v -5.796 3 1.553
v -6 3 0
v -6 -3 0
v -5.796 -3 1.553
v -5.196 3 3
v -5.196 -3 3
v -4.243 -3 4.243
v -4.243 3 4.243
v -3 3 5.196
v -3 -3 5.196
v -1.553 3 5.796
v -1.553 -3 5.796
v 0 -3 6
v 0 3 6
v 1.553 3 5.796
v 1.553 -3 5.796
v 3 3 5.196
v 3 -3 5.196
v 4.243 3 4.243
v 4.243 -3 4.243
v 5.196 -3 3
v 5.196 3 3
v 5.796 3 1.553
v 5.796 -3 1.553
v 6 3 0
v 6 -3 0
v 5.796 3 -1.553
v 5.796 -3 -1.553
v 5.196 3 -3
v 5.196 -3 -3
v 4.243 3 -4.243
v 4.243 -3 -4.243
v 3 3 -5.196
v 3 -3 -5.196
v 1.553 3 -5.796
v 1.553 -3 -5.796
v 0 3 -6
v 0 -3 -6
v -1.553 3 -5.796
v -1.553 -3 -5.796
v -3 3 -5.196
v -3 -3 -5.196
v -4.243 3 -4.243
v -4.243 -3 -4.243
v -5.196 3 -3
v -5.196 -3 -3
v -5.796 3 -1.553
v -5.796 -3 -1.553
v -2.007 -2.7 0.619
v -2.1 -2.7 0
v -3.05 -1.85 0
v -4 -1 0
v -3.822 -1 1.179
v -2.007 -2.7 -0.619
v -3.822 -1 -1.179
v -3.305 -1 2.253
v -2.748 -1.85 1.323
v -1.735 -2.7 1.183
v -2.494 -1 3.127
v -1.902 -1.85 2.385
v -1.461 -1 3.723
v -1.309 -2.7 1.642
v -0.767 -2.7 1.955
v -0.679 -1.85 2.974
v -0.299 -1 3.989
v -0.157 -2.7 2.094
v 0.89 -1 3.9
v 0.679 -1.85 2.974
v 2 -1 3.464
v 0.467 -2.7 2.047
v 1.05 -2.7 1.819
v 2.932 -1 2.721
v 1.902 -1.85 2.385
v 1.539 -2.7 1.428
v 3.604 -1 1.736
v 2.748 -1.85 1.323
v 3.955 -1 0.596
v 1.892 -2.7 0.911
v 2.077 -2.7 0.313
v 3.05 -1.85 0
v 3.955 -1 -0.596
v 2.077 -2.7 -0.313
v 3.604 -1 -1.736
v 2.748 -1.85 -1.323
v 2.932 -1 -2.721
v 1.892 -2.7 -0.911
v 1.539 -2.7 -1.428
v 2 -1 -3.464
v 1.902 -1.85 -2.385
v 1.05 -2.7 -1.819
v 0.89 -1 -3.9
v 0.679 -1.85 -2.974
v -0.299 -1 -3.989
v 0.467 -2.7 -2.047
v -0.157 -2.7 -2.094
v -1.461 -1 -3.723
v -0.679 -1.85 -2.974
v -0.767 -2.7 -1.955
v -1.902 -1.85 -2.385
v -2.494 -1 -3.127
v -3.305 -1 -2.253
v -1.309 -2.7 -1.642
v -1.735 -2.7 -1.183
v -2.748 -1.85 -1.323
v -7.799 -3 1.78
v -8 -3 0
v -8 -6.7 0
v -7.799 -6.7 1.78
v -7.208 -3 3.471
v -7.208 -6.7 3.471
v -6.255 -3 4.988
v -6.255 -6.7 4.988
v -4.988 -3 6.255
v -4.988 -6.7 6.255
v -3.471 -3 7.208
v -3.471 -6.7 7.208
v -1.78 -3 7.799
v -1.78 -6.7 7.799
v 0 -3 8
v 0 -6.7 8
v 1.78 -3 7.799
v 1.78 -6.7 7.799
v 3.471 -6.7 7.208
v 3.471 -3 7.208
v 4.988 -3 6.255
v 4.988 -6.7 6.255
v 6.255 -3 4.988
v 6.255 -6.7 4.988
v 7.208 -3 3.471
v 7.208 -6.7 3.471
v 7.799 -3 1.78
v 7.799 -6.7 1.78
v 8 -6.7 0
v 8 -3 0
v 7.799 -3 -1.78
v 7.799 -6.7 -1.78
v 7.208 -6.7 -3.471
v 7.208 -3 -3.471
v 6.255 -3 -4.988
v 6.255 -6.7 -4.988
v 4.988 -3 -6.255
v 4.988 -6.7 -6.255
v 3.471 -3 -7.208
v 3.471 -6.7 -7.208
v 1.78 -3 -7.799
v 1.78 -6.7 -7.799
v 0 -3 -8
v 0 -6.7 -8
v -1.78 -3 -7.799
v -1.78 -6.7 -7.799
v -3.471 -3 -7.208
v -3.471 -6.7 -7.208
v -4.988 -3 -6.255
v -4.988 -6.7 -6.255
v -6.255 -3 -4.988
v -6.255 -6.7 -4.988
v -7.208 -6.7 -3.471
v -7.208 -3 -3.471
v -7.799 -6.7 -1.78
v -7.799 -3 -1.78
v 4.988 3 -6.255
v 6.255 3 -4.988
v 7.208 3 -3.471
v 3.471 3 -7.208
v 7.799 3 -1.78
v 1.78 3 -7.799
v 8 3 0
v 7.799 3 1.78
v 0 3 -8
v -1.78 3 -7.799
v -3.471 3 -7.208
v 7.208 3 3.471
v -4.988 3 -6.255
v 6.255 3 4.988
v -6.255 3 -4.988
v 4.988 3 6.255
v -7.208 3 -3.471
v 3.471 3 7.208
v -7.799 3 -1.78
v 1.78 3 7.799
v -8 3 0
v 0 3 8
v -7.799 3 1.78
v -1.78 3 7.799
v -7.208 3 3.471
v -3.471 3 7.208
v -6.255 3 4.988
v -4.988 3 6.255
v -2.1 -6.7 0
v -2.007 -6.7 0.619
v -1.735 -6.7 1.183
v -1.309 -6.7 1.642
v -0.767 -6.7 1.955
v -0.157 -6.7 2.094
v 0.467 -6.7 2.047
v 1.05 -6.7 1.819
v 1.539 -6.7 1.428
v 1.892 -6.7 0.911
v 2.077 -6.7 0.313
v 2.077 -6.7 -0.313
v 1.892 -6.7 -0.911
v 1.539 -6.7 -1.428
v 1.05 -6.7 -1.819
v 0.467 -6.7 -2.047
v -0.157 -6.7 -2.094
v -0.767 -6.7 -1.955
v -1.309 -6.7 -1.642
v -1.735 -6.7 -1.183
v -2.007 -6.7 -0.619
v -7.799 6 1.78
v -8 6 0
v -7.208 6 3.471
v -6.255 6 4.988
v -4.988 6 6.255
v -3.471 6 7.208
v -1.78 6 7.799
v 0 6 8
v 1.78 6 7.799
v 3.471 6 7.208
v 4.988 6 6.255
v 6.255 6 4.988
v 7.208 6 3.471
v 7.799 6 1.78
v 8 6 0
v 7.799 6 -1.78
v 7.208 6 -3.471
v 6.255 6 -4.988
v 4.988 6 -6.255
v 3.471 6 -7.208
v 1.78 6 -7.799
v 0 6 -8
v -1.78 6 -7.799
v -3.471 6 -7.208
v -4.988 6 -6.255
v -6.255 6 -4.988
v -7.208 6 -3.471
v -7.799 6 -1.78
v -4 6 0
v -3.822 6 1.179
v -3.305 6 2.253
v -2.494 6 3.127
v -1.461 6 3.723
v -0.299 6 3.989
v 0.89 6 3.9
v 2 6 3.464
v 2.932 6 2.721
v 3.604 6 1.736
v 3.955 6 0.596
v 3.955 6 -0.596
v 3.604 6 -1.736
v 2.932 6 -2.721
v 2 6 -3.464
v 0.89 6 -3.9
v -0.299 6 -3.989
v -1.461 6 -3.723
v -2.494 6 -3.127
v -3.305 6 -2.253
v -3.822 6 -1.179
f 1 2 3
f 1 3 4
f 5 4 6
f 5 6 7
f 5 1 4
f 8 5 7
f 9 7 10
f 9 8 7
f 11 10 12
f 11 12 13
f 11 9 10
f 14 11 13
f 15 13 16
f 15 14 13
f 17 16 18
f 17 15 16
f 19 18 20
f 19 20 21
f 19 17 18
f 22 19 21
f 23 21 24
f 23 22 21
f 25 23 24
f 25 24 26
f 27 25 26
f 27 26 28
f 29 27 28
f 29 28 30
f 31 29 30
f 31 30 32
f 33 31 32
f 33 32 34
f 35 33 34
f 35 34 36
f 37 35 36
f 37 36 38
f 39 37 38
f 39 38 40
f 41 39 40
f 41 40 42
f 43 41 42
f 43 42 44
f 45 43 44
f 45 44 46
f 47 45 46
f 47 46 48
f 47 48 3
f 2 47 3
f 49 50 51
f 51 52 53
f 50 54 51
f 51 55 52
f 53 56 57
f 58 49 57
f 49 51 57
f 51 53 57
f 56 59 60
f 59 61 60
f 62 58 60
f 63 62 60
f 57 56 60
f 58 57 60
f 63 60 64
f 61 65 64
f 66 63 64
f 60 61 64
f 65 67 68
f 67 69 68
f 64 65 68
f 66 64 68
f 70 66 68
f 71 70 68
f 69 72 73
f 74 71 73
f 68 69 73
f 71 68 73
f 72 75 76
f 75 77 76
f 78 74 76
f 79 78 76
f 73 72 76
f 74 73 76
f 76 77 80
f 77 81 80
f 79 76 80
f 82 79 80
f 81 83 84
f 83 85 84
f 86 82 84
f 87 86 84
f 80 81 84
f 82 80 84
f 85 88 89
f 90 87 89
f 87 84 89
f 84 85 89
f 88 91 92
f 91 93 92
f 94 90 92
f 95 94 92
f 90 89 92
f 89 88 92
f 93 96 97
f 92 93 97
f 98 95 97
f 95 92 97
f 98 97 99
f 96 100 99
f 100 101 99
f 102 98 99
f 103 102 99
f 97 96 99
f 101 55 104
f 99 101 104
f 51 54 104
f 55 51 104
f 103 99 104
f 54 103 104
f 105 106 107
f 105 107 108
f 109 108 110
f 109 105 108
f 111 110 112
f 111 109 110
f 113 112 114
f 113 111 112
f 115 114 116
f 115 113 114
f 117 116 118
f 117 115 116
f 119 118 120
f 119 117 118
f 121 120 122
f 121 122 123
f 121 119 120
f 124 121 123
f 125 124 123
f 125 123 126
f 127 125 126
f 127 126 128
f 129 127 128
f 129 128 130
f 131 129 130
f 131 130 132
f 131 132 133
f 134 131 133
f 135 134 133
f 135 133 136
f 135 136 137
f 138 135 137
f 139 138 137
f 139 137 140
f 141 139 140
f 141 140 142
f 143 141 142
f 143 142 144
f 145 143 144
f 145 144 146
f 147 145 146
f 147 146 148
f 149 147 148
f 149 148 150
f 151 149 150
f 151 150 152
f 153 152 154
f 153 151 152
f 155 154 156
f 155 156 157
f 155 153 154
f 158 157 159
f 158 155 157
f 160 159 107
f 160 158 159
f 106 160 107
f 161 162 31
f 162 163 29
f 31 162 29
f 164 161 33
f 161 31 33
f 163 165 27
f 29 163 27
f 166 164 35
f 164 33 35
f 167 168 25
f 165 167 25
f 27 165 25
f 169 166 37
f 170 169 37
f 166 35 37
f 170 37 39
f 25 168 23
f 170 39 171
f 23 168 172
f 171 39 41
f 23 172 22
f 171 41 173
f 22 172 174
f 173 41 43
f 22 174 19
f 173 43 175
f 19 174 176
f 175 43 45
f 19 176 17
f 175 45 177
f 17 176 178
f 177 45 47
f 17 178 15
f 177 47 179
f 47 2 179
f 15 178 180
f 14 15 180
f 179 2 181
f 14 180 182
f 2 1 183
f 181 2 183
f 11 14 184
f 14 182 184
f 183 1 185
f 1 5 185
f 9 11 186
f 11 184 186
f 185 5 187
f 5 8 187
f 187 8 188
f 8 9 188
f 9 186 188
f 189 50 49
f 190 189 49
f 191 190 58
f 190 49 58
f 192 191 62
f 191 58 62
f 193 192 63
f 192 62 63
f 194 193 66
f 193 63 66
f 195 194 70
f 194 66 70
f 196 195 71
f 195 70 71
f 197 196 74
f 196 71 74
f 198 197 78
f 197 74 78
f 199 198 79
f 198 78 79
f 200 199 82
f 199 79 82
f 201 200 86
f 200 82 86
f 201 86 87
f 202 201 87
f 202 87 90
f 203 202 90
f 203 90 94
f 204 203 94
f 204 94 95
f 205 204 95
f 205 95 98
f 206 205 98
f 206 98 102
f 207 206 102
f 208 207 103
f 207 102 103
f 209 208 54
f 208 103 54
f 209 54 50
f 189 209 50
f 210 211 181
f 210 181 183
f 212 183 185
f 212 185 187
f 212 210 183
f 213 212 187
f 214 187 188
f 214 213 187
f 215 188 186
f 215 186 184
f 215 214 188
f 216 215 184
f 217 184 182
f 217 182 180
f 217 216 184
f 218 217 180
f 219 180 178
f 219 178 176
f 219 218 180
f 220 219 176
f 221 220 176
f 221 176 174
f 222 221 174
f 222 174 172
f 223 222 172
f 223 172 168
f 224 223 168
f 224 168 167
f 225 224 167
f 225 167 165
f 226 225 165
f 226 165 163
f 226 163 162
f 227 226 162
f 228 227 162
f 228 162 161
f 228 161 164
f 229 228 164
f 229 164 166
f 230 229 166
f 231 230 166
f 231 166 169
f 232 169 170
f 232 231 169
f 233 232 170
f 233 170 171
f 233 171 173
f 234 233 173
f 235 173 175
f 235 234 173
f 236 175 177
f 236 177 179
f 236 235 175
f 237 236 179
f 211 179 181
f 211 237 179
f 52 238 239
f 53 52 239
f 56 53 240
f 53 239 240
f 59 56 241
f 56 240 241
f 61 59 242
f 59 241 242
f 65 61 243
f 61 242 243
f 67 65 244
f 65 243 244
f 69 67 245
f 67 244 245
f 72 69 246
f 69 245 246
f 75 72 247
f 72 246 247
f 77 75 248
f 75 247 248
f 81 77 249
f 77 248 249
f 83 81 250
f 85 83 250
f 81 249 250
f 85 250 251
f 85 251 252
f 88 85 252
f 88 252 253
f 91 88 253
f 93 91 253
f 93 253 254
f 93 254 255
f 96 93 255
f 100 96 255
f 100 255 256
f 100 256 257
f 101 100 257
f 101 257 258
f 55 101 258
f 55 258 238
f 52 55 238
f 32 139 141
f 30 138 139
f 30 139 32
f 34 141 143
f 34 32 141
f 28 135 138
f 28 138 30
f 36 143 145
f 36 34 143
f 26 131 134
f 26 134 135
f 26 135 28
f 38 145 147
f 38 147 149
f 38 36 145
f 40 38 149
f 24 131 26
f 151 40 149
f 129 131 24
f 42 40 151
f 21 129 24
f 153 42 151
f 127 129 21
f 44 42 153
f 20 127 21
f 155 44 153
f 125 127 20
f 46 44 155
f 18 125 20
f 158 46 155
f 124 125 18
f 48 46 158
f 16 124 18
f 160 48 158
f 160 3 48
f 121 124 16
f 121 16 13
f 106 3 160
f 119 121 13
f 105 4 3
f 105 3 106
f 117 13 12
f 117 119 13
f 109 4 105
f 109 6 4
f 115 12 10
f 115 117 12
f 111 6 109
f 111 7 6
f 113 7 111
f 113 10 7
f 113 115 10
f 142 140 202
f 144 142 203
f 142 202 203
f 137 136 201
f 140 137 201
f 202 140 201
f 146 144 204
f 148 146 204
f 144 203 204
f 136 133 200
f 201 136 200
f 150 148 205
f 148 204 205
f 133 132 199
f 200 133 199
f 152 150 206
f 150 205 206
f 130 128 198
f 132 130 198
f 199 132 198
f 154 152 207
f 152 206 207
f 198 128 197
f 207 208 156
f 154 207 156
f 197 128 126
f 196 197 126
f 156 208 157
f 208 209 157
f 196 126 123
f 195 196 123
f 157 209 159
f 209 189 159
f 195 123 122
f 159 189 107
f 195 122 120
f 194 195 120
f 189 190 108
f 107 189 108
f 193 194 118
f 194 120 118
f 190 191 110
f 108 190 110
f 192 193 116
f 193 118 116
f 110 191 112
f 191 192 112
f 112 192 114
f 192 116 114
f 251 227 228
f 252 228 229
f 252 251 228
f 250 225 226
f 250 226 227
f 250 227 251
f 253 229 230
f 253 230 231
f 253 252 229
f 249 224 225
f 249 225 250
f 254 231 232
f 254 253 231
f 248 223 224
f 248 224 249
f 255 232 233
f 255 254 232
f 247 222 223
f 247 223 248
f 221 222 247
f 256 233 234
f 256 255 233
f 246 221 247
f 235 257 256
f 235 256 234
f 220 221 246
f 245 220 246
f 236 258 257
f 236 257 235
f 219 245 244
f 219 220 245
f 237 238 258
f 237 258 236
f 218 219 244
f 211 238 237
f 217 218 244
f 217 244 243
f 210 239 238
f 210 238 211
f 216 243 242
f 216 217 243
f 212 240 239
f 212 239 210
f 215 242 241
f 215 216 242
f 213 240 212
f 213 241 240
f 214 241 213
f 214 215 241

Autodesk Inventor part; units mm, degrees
ref_plane "YZ Plane" through (0, 0, 0) normal (1, 0, 0) x (0, 1, 0)
ref_plane "XZ Plane" through (0, 0, 0) normal (0, 1, 0) x (-1, 0, 0)
ref_plane "XY Plane" through (0, 0, 0) normal (0, 0, 1) x (1, 0, 0)
sketch "Sketch1" plane through (0, 0, 0) normal (0, 0, 1) x (1, 0, 0)
  line L0 (-2.1, -6.7) -> (-8, -6.7)
  line L1 (-8, -6.7) -> (-8, -3)
  line L2 (-8, -3) -> (-6, -3)
  line L3 (-6, -3) -> (-6, 3)
  line L4 (-6, 3) -> (-8, 3)
  line L5 (-8, 3) -> (-8, 6)
  line L6 (-8, 6) -> (-4, 6)
  line L7 (0, 0) -> (-16, 0) construction
  line L8 (0, -9.24) -> (0, 8.54) projected
  line L9 (-2.1, -6.7) -> (-2.1, -2.7)
  line L10 (-2.1, -2.7) -> (-4, -1)
  line L11 (-4, -1) -> (-4, 6)
  dimension "d1" = 8
  dimension "d2" = 3.7
  dimension "d3" = 3
  dimension "d4" = 6
  dimension "d5" = 6
  dimension "d7" = 4
  dimension "d8" = 2.1
  dimension "d9" = 7
  dimension "d11" = 4
revolve "Revolution2" add sketch "Sketch1" angle 360 about axis through (0, -10, 0) along (0, 1, 0)
properties part number "Groove_Mount_Adaptor_1_75mm"
